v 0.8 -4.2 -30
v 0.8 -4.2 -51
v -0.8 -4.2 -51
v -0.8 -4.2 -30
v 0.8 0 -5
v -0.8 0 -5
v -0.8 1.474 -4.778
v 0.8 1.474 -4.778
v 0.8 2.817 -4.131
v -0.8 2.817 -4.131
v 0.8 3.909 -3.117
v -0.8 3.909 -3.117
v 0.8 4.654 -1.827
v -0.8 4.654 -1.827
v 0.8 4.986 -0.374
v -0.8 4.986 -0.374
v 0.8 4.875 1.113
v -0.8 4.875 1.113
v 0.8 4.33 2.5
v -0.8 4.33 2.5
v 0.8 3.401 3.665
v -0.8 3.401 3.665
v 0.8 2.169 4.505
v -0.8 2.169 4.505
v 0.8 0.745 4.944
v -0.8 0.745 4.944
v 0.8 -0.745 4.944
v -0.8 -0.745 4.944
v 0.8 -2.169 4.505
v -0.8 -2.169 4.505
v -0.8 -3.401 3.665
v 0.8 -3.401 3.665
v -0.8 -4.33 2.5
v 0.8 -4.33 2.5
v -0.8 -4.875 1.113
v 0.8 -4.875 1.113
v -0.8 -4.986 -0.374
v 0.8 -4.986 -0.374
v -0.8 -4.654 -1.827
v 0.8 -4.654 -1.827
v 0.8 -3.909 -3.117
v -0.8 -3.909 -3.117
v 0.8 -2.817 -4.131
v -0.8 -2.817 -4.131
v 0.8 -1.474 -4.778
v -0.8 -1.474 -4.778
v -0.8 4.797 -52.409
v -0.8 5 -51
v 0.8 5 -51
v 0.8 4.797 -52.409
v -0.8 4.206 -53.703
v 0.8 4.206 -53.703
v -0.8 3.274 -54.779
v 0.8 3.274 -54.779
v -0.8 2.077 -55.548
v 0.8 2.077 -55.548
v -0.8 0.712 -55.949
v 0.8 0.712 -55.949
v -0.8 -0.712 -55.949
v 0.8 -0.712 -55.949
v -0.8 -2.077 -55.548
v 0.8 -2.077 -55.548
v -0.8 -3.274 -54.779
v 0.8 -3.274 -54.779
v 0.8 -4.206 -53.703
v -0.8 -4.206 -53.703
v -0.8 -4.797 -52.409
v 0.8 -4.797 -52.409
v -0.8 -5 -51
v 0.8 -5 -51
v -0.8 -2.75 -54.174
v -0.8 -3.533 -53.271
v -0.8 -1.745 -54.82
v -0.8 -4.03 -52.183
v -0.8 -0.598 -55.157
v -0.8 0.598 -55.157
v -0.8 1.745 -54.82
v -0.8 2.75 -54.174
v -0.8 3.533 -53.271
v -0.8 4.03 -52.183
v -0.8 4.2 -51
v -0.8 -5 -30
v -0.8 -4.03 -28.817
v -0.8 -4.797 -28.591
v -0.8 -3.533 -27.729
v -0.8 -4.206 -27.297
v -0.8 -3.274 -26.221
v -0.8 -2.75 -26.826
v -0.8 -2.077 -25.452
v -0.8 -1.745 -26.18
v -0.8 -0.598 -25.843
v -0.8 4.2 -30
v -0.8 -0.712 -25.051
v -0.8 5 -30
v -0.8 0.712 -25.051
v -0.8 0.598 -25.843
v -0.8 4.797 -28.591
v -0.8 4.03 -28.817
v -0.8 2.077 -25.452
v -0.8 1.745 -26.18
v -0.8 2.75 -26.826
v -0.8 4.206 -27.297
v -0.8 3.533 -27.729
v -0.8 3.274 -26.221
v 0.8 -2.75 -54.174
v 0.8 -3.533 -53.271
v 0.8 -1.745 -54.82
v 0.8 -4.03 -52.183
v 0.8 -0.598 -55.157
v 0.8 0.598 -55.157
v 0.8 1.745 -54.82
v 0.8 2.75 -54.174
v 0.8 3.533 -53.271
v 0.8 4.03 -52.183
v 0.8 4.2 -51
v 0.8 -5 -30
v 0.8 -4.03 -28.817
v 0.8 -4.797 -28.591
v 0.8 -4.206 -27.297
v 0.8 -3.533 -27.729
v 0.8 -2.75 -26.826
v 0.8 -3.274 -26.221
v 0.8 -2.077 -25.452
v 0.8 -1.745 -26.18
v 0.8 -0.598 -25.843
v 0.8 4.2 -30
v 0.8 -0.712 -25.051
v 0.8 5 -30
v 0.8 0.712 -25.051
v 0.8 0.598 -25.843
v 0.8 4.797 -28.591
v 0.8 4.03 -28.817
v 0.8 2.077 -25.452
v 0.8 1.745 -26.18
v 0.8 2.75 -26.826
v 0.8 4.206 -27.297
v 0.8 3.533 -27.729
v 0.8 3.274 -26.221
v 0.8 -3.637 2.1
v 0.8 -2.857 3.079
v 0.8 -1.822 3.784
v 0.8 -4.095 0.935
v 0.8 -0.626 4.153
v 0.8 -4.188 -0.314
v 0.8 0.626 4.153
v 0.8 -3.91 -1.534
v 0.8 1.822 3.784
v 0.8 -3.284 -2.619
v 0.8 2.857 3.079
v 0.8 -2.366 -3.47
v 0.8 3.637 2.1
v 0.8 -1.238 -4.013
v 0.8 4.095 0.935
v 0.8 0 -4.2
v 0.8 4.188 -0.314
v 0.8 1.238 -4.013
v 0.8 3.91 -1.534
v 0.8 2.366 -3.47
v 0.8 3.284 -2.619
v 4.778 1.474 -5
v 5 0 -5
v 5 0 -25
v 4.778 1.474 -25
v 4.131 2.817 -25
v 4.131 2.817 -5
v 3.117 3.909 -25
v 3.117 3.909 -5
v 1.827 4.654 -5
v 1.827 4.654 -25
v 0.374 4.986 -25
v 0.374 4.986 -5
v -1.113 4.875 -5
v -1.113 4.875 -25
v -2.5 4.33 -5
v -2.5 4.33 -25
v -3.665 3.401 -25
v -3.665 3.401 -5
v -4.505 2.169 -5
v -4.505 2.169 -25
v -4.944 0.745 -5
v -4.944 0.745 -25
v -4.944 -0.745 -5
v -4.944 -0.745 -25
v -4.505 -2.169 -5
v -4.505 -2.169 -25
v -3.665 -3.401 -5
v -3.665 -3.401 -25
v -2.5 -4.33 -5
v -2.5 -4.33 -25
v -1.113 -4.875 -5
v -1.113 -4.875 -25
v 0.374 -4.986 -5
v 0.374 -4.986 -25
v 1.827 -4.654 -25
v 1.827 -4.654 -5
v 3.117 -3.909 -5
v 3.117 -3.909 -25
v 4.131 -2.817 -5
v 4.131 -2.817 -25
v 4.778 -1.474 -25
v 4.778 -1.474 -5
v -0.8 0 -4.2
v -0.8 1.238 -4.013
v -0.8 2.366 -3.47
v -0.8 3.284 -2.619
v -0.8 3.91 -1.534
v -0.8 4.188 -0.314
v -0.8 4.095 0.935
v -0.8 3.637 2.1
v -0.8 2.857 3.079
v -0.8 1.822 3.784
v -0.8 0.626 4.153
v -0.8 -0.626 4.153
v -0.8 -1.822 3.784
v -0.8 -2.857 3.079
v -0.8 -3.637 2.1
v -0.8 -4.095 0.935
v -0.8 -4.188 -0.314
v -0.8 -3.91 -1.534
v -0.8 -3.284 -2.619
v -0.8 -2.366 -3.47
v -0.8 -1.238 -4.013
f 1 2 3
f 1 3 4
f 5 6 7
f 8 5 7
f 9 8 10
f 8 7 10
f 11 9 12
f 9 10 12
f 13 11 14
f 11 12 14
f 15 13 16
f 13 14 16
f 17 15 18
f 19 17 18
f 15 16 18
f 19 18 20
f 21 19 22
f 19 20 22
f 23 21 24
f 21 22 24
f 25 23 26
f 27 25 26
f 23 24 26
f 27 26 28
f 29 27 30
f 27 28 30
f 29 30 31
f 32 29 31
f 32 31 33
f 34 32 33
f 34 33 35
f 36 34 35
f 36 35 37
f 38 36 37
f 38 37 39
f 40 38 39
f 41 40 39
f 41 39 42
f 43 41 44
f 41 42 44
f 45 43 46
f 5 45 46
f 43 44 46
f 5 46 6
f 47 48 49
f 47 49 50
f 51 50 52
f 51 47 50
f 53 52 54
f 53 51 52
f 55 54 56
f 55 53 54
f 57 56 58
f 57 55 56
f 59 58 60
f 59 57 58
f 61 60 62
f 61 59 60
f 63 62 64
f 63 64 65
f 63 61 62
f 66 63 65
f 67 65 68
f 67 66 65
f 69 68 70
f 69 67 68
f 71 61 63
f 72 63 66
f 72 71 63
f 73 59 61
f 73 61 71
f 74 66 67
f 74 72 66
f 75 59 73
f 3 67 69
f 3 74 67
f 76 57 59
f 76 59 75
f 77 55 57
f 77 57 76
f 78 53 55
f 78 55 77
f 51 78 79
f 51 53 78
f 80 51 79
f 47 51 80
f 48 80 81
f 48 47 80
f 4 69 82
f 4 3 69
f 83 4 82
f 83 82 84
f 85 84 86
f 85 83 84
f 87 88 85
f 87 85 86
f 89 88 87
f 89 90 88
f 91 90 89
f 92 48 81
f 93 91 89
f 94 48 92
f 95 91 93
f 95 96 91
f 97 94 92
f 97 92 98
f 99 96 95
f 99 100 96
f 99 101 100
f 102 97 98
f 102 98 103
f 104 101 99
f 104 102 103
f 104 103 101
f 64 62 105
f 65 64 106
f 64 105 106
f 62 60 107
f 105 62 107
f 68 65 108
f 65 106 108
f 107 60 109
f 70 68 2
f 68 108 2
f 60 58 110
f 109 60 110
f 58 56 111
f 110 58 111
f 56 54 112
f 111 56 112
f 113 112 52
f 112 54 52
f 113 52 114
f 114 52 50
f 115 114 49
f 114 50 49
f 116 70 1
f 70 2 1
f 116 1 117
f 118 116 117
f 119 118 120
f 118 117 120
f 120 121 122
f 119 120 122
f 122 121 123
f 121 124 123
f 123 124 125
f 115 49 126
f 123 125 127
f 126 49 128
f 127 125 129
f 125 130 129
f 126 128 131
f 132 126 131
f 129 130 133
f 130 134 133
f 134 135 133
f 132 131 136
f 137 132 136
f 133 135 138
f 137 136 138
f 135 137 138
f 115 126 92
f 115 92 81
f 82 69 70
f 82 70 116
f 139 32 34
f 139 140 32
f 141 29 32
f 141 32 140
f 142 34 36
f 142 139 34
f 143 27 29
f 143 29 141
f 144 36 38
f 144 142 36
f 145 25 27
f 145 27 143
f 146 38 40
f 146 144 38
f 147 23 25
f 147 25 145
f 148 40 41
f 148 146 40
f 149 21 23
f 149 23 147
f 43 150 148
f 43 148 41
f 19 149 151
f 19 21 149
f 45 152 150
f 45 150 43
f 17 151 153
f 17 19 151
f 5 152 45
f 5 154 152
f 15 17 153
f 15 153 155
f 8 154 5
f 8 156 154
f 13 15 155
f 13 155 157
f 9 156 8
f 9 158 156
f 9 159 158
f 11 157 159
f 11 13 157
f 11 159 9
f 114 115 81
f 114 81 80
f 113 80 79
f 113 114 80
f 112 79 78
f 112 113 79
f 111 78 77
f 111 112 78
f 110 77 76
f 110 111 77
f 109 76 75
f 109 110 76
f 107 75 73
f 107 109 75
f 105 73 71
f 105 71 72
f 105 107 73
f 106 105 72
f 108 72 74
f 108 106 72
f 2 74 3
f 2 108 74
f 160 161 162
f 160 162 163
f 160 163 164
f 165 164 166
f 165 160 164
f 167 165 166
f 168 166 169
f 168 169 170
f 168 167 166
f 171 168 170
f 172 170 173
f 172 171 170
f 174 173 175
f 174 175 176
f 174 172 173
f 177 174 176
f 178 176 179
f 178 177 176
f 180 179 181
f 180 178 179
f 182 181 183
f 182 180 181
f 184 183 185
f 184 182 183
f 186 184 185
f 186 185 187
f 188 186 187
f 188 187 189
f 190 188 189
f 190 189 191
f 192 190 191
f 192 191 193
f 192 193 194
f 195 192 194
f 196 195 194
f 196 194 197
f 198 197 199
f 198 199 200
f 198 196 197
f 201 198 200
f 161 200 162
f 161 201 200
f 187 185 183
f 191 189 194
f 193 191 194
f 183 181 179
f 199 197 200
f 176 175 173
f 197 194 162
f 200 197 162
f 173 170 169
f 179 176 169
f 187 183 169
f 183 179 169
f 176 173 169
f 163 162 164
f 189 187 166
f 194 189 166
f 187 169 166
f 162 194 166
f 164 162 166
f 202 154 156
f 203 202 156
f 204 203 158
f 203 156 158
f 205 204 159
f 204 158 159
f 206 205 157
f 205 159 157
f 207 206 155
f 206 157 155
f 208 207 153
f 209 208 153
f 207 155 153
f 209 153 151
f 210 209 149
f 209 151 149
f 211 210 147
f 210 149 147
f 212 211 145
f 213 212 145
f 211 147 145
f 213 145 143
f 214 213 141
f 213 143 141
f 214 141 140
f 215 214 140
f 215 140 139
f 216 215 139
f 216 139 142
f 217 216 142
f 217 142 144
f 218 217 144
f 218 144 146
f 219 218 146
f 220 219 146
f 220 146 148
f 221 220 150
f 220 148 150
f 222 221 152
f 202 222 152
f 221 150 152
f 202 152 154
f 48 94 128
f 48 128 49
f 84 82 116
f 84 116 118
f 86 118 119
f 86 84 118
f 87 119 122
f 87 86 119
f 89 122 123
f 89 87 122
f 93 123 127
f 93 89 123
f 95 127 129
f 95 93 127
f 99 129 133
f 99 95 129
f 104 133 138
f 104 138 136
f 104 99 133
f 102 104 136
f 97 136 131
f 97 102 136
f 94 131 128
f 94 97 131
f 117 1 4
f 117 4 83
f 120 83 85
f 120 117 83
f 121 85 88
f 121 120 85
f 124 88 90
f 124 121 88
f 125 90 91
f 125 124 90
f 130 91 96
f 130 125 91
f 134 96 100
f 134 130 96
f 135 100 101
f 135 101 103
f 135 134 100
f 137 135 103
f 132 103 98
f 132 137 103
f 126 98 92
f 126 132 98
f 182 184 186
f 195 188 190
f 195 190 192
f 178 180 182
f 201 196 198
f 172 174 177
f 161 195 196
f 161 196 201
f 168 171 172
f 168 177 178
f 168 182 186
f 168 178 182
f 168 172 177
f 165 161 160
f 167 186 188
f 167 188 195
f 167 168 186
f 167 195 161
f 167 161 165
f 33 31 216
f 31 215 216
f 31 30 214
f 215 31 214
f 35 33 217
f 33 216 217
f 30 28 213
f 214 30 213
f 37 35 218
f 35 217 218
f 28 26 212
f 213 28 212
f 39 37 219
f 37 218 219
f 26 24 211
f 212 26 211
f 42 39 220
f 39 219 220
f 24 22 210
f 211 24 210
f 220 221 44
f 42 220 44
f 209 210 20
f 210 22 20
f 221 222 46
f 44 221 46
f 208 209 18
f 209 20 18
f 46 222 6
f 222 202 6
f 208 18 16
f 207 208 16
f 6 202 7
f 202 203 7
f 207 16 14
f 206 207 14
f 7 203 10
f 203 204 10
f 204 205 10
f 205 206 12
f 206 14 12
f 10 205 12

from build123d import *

# Parameters (mm, degrees)
BOSS_EXTRUDE1_DEPTH        = 0.8
BOSS_EXTRUDE1_DEPTH_BACK   = 0.8
SKETCH1_R                  = 5
BOSS_EXTRUDE1_2_DEPTH      = 0.8
BOSS_EXTRUDE1_2_DEPTH_BACK = 0.8
SKETCH2_R                  = 4.2
CUT_EXTRUDE1_DEPTH         = 1.6
SKETCH6_R                  = 5
BOSS_EXTRUDE3_DEPTH        = 20


with BuildPart() as part:
    # Sketch1 → Boss-Extrude1 (new, two sides: drawn at the far end of the back side and taken through both)
    with BuildSketch(Plane(origin=(0, 0, 0), x_dir=(0, 0, -1), z_dir=(1, 0, 0)).offset(-BOSS_EXTRUDE1_DEPTH_BACK)):
        Circle(SKETCH1_R)
    extrude(amount=BOSS_EXTRUDE1_DEPTH + BOSS_EXTRUDE1_DEPTH_BACK)


with BuildPart() as body_2:
    # Sketch1 → Boss-Extrude1 2 (new, two sides: drawn at the far end of the back side and taken through both)
    with BuildSketch(Plane(origin=(0, 0, 0), x_dir=(0, 0, -1), z_dir=(1, 0, 0)).offset(-BOSS_EXTRUDE1_2_DEPTH_BACK)):
        with BuildLine():
            Line((51, -5), (30, -5))
            ThreePointArc((30, -5), (25, 0), (30, 5))
            Line((30, 5), (51, 5))
            ThreePointArc((51, 5), (56, 0), (51, -5))
        make_face()
    extrude(amount=BOSS_EXTRUDE1_2_DEPTH + BOSS_EXTRUDE1_2_DEPTH_BACK)


with BuildPart() as cut_extrude1_tool:
    # Sketch2 → Cut-Extrude1 (new body)
    with BuildSketch(Plane(origin=(0.8, 0, 0), x_dir=(0, 0, -1), z_dir=(1, 0, 0))):
        Circle(SKETCH2_R)
        with BuildLine():
            Line((51, -4.2), (30, -4.2))
            ThreePointArc((30, -4.2), (25.8, 0), (30, 4.2))
            Line((30, 4.2), (51, 4.2))
            ThreePointArc((51, 4.2), (55.2, 0), (51, -4.2))
        make_face()
    extrude(amount=-CUT_EXTRUDE1_DEPTH)


with BuildPart() as part_1:
    add(part.part)

    # Cut-Extrude1: cut by cut_extrude1_tool
    add(cut_extrude1_tool.part, mode=Mode.SUBTRACT)


with BuildPart() as body_2_1:
    add(body_2.part)

    # Cut-Extrude1: cut by cut_extrude1_tool
    add(cut_extrude1_tool.part, mode=Mode.SUBTRACT)


with BuildPart() as body_3:
    # Sketch6 → Boss-Extrude3 (new body)
    with BuildSketch(Plane.XY.offset(-5)):
        Circle(SKETCH6_R)
    extrude(amount=-BOSS_EXTRUDE3_DEPTH)


solid = Compound([part_1.part, body_2_1.part, body_3.part])
